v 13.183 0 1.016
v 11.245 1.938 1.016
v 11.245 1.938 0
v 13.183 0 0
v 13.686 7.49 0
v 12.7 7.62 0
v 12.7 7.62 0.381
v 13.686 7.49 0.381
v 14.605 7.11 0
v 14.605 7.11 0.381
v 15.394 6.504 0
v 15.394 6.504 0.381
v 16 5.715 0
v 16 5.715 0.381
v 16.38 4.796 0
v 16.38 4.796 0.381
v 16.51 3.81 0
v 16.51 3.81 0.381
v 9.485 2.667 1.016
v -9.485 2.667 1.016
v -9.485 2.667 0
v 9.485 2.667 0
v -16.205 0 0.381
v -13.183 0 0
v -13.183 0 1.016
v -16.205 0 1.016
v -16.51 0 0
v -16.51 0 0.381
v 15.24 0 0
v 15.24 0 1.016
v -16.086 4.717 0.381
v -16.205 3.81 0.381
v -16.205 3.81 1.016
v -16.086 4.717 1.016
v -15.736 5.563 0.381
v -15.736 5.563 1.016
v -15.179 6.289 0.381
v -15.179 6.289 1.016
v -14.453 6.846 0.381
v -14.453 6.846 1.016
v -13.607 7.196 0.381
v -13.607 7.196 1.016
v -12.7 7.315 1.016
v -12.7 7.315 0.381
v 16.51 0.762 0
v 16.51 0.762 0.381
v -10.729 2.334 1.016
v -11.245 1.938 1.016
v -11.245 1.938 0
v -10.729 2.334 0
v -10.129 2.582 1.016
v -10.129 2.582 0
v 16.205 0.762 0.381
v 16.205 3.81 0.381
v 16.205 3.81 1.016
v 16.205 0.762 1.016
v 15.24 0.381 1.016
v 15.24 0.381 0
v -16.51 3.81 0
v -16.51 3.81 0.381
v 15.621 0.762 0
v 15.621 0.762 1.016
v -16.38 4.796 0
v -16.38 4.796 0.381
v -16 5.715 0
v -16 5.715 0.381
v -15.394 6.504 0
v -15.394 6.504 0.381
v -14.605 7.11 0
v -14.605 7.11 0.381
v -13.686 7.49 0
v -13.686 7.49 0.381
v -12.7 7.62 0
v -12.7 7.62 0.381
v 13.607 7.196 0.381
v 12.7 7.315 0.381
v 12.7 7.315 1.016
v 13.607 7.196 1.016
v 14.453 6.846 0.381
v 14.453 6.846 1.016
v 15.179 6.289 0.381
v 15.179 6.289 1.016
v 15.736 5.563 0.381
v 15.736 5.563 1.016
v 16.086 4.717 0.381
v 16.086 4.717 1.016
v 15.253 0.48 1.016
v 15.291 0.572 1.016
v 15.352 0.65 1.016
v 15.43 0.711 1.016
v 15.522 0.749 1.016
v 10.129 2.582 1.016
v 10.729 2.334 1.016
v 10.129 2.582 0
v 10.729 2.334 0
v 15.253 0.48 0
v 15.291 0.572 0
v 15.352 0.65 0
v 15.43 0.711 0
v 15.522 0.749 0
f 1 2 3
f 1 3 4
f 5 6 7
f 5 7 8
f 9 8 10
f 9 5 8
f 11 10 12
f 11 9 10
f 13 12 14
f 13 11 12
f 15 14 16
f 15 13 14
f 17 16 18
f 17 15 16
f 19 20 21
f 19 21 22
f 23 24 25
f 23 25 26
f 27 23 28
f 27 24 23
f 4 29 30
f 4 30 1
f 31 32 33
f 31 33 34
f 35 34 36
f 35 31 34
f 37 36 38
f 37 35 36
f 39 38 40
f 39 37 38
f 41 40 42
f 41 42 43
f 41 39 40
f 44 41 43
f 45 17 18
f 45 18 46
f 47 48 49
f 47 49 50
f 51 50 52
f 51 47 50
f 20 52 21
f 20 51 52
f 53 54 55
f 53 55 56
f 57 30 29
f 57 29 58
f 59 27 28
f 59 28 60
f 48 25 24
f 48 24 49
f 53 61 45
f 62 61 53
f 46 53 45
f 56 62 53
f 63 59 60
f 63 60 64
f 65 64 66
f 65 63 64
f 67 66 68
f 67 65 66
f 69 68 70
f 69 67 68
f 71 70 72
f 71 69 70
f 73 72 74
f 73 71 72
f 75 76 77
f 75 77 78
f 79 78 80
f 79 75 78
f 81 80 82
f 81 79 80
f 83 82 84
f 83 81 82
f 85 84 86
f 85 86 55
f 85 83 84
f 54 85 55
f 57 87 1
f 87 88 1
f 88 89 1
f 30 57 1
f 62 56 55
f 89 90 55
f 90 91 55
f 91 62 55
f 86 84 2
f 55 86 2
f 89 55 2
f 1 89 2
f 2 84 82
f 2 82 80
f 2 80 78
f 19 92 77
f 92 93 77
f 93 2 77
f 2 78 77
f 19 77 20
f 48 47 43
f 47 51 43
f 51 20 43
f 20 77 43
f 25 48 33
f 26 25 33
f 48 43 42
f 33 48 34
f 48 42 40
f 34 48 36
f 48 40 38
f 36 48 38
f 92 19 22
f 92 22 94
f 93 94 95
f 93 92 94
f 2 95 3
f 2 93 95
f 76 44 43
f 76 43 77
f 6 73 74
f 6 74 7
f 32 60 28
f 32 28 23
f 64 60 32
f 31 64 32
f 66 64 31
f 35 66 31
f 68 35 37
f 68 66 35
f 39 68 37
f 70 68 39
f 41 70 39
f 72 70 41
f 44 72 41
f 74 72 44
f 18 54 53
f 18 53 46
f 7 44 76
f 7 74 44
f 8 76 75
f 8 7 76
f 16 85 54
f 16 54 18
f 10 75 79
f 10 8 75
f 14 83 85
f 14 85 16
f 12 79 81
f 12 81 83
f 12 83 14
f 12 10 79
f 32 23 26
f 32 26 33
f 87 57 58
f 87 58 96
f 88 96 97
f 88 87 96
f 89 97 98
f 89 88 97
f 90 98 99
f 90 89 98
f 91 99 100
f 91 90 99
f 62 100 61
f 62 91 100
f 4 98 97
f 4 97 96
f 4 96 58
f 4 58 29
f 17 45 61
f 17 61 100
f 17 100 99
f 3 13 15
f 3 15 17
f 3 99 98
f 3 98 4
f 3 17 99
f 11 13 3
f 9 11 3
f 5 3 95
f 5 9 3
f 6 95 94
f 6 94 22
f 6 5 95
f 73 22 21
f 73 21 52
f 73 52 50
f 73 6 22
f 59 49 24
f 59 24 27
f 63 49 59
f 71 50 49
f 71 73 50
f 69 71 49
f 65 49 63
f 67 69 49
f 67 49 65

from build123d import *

# Parameters (mm, degrees)
BOSS_EXTRUDE1_DEPTH = 1.016
CUT_EXTRUDE1_START  = -0.635
CUT_EXTRUDE1_DEPTH  = 0.635
CUT_EXTRUDE2_DEPTH  = 19.211994839
CUT_EXTRUDE3_DEPTH  = 19.211994839


with BuildPart() as part:
    # Sketch1 → Boss-Extrude1 (new body)
    with BuildSketch(Plane.XY):
        with BuildLine():
            Line((-12.7, 7.62), (12.7, 7.62))
            ThreePointArc((12.7, 7.62), (15.394076836, 6.504076836), (16.51, 3.81))
            Line((16.51, 3.81), (16.51, 0))
            Line((16.51, 0), (-16.51, 0))
            Line((-16.51, 0), (-16.51, 3.81))
            ThreePointArc((-16.51, 3.81), (-15.394076836, 6.504076836), (-12.7, 7.62))
        make_face()
    extrude(amount=BOSS_EXTRUDE1_DEPTH)

    # Sketch2 → Cut-Extrude1 (cut)
    with BuildSketch(Plane.XY.offset(1.016).offset(CUT_EXTRUDE1_START)):
        with BuildLine():
            Line((16.2052, 0), (16.51, 0))
            Line((16.51, 0), (16.51, 3.81))
            ThreePointArc((16.51, 3.81), (15.394076836, 6.504076836), (12.7, 7.62))
            Line((12.7, 7.62), (-12.7, 7.62))
            ThreePointArc((-12.7, 7.62), (-15.394076836, 6.504076836), (-16.51, 3.81))
            Line((-16.51, 3.81), (-16.51, 0))
            Line((-16.51, 0), (-16.2052, 0))
            Line((-16.2052, 0), (-16.2052, 3.81))
            ThreePointArc((-16.2052, 3.81), (-15.178550689, 6.288550689), (-12.7, 7.3152))
            Line((-12.7, 7.3152), (12.7, 7.3152))
            ThreePointArc((12.7, 7.3152), (15.178550689, 6.288550689), (16.2052, 3.81))
            Line((16.2052, 3.81), (16.2052, 0))
        make_face()
    extrude(amount=CUT_EXTRUDE1_DEPTH, mode=Mode.SUBTRACT)

    # Sketch3 → Cut-Extrude2 (cut, through all)
    with BuildSketch(Plane.XY.offset(1.016)):
        with BuildLine():
            Line((-13.1826, 0), (-11.2446698, 1.9379302))
            ThreePointArc((-11.2446698, 1.9379302), (-10.4371152, 2.477520932), (-9.484539601, 2.667))
            Line((-9.484539601, 2.667), (9.484539601, 2.667))
            ThreePointArc((9.484539601, 2.667), (10.4371152, 2.477520932), (11.2446698, 1.9379302))
            Line((11.2446698, 1.9379302), (13.1826, 0))
            Line((13.1826, 0), (-13.1826, 0))
        make_face()
    extrude(amount=-CUT_EXTRUDE2_DEPTH, mode=Mode.SUBTRACT)

    # Sketch4 → Cut-Extrude3 (cut, through all)
    with BuildSketch(Plane.XY.offset(1.016)):
        with BuildLine():
            Line((16.51, 0), (15.24, 0))
            Line((15.24, 0), (15.24, 0.381))
            ThreePointArc((15.24, 0.381), (15.351592316, 0.650407684), (15.621, 0.762))
            Line((15.621, 0.762), (16.51, 0.762))
            Line((16.51, 0.762), (16.51, 0))
        make_face()
    extrude(amount=-CUT_EXTRUDE3_DEPTH, mode=Mode.SUBTRACT)


solid = part.part
